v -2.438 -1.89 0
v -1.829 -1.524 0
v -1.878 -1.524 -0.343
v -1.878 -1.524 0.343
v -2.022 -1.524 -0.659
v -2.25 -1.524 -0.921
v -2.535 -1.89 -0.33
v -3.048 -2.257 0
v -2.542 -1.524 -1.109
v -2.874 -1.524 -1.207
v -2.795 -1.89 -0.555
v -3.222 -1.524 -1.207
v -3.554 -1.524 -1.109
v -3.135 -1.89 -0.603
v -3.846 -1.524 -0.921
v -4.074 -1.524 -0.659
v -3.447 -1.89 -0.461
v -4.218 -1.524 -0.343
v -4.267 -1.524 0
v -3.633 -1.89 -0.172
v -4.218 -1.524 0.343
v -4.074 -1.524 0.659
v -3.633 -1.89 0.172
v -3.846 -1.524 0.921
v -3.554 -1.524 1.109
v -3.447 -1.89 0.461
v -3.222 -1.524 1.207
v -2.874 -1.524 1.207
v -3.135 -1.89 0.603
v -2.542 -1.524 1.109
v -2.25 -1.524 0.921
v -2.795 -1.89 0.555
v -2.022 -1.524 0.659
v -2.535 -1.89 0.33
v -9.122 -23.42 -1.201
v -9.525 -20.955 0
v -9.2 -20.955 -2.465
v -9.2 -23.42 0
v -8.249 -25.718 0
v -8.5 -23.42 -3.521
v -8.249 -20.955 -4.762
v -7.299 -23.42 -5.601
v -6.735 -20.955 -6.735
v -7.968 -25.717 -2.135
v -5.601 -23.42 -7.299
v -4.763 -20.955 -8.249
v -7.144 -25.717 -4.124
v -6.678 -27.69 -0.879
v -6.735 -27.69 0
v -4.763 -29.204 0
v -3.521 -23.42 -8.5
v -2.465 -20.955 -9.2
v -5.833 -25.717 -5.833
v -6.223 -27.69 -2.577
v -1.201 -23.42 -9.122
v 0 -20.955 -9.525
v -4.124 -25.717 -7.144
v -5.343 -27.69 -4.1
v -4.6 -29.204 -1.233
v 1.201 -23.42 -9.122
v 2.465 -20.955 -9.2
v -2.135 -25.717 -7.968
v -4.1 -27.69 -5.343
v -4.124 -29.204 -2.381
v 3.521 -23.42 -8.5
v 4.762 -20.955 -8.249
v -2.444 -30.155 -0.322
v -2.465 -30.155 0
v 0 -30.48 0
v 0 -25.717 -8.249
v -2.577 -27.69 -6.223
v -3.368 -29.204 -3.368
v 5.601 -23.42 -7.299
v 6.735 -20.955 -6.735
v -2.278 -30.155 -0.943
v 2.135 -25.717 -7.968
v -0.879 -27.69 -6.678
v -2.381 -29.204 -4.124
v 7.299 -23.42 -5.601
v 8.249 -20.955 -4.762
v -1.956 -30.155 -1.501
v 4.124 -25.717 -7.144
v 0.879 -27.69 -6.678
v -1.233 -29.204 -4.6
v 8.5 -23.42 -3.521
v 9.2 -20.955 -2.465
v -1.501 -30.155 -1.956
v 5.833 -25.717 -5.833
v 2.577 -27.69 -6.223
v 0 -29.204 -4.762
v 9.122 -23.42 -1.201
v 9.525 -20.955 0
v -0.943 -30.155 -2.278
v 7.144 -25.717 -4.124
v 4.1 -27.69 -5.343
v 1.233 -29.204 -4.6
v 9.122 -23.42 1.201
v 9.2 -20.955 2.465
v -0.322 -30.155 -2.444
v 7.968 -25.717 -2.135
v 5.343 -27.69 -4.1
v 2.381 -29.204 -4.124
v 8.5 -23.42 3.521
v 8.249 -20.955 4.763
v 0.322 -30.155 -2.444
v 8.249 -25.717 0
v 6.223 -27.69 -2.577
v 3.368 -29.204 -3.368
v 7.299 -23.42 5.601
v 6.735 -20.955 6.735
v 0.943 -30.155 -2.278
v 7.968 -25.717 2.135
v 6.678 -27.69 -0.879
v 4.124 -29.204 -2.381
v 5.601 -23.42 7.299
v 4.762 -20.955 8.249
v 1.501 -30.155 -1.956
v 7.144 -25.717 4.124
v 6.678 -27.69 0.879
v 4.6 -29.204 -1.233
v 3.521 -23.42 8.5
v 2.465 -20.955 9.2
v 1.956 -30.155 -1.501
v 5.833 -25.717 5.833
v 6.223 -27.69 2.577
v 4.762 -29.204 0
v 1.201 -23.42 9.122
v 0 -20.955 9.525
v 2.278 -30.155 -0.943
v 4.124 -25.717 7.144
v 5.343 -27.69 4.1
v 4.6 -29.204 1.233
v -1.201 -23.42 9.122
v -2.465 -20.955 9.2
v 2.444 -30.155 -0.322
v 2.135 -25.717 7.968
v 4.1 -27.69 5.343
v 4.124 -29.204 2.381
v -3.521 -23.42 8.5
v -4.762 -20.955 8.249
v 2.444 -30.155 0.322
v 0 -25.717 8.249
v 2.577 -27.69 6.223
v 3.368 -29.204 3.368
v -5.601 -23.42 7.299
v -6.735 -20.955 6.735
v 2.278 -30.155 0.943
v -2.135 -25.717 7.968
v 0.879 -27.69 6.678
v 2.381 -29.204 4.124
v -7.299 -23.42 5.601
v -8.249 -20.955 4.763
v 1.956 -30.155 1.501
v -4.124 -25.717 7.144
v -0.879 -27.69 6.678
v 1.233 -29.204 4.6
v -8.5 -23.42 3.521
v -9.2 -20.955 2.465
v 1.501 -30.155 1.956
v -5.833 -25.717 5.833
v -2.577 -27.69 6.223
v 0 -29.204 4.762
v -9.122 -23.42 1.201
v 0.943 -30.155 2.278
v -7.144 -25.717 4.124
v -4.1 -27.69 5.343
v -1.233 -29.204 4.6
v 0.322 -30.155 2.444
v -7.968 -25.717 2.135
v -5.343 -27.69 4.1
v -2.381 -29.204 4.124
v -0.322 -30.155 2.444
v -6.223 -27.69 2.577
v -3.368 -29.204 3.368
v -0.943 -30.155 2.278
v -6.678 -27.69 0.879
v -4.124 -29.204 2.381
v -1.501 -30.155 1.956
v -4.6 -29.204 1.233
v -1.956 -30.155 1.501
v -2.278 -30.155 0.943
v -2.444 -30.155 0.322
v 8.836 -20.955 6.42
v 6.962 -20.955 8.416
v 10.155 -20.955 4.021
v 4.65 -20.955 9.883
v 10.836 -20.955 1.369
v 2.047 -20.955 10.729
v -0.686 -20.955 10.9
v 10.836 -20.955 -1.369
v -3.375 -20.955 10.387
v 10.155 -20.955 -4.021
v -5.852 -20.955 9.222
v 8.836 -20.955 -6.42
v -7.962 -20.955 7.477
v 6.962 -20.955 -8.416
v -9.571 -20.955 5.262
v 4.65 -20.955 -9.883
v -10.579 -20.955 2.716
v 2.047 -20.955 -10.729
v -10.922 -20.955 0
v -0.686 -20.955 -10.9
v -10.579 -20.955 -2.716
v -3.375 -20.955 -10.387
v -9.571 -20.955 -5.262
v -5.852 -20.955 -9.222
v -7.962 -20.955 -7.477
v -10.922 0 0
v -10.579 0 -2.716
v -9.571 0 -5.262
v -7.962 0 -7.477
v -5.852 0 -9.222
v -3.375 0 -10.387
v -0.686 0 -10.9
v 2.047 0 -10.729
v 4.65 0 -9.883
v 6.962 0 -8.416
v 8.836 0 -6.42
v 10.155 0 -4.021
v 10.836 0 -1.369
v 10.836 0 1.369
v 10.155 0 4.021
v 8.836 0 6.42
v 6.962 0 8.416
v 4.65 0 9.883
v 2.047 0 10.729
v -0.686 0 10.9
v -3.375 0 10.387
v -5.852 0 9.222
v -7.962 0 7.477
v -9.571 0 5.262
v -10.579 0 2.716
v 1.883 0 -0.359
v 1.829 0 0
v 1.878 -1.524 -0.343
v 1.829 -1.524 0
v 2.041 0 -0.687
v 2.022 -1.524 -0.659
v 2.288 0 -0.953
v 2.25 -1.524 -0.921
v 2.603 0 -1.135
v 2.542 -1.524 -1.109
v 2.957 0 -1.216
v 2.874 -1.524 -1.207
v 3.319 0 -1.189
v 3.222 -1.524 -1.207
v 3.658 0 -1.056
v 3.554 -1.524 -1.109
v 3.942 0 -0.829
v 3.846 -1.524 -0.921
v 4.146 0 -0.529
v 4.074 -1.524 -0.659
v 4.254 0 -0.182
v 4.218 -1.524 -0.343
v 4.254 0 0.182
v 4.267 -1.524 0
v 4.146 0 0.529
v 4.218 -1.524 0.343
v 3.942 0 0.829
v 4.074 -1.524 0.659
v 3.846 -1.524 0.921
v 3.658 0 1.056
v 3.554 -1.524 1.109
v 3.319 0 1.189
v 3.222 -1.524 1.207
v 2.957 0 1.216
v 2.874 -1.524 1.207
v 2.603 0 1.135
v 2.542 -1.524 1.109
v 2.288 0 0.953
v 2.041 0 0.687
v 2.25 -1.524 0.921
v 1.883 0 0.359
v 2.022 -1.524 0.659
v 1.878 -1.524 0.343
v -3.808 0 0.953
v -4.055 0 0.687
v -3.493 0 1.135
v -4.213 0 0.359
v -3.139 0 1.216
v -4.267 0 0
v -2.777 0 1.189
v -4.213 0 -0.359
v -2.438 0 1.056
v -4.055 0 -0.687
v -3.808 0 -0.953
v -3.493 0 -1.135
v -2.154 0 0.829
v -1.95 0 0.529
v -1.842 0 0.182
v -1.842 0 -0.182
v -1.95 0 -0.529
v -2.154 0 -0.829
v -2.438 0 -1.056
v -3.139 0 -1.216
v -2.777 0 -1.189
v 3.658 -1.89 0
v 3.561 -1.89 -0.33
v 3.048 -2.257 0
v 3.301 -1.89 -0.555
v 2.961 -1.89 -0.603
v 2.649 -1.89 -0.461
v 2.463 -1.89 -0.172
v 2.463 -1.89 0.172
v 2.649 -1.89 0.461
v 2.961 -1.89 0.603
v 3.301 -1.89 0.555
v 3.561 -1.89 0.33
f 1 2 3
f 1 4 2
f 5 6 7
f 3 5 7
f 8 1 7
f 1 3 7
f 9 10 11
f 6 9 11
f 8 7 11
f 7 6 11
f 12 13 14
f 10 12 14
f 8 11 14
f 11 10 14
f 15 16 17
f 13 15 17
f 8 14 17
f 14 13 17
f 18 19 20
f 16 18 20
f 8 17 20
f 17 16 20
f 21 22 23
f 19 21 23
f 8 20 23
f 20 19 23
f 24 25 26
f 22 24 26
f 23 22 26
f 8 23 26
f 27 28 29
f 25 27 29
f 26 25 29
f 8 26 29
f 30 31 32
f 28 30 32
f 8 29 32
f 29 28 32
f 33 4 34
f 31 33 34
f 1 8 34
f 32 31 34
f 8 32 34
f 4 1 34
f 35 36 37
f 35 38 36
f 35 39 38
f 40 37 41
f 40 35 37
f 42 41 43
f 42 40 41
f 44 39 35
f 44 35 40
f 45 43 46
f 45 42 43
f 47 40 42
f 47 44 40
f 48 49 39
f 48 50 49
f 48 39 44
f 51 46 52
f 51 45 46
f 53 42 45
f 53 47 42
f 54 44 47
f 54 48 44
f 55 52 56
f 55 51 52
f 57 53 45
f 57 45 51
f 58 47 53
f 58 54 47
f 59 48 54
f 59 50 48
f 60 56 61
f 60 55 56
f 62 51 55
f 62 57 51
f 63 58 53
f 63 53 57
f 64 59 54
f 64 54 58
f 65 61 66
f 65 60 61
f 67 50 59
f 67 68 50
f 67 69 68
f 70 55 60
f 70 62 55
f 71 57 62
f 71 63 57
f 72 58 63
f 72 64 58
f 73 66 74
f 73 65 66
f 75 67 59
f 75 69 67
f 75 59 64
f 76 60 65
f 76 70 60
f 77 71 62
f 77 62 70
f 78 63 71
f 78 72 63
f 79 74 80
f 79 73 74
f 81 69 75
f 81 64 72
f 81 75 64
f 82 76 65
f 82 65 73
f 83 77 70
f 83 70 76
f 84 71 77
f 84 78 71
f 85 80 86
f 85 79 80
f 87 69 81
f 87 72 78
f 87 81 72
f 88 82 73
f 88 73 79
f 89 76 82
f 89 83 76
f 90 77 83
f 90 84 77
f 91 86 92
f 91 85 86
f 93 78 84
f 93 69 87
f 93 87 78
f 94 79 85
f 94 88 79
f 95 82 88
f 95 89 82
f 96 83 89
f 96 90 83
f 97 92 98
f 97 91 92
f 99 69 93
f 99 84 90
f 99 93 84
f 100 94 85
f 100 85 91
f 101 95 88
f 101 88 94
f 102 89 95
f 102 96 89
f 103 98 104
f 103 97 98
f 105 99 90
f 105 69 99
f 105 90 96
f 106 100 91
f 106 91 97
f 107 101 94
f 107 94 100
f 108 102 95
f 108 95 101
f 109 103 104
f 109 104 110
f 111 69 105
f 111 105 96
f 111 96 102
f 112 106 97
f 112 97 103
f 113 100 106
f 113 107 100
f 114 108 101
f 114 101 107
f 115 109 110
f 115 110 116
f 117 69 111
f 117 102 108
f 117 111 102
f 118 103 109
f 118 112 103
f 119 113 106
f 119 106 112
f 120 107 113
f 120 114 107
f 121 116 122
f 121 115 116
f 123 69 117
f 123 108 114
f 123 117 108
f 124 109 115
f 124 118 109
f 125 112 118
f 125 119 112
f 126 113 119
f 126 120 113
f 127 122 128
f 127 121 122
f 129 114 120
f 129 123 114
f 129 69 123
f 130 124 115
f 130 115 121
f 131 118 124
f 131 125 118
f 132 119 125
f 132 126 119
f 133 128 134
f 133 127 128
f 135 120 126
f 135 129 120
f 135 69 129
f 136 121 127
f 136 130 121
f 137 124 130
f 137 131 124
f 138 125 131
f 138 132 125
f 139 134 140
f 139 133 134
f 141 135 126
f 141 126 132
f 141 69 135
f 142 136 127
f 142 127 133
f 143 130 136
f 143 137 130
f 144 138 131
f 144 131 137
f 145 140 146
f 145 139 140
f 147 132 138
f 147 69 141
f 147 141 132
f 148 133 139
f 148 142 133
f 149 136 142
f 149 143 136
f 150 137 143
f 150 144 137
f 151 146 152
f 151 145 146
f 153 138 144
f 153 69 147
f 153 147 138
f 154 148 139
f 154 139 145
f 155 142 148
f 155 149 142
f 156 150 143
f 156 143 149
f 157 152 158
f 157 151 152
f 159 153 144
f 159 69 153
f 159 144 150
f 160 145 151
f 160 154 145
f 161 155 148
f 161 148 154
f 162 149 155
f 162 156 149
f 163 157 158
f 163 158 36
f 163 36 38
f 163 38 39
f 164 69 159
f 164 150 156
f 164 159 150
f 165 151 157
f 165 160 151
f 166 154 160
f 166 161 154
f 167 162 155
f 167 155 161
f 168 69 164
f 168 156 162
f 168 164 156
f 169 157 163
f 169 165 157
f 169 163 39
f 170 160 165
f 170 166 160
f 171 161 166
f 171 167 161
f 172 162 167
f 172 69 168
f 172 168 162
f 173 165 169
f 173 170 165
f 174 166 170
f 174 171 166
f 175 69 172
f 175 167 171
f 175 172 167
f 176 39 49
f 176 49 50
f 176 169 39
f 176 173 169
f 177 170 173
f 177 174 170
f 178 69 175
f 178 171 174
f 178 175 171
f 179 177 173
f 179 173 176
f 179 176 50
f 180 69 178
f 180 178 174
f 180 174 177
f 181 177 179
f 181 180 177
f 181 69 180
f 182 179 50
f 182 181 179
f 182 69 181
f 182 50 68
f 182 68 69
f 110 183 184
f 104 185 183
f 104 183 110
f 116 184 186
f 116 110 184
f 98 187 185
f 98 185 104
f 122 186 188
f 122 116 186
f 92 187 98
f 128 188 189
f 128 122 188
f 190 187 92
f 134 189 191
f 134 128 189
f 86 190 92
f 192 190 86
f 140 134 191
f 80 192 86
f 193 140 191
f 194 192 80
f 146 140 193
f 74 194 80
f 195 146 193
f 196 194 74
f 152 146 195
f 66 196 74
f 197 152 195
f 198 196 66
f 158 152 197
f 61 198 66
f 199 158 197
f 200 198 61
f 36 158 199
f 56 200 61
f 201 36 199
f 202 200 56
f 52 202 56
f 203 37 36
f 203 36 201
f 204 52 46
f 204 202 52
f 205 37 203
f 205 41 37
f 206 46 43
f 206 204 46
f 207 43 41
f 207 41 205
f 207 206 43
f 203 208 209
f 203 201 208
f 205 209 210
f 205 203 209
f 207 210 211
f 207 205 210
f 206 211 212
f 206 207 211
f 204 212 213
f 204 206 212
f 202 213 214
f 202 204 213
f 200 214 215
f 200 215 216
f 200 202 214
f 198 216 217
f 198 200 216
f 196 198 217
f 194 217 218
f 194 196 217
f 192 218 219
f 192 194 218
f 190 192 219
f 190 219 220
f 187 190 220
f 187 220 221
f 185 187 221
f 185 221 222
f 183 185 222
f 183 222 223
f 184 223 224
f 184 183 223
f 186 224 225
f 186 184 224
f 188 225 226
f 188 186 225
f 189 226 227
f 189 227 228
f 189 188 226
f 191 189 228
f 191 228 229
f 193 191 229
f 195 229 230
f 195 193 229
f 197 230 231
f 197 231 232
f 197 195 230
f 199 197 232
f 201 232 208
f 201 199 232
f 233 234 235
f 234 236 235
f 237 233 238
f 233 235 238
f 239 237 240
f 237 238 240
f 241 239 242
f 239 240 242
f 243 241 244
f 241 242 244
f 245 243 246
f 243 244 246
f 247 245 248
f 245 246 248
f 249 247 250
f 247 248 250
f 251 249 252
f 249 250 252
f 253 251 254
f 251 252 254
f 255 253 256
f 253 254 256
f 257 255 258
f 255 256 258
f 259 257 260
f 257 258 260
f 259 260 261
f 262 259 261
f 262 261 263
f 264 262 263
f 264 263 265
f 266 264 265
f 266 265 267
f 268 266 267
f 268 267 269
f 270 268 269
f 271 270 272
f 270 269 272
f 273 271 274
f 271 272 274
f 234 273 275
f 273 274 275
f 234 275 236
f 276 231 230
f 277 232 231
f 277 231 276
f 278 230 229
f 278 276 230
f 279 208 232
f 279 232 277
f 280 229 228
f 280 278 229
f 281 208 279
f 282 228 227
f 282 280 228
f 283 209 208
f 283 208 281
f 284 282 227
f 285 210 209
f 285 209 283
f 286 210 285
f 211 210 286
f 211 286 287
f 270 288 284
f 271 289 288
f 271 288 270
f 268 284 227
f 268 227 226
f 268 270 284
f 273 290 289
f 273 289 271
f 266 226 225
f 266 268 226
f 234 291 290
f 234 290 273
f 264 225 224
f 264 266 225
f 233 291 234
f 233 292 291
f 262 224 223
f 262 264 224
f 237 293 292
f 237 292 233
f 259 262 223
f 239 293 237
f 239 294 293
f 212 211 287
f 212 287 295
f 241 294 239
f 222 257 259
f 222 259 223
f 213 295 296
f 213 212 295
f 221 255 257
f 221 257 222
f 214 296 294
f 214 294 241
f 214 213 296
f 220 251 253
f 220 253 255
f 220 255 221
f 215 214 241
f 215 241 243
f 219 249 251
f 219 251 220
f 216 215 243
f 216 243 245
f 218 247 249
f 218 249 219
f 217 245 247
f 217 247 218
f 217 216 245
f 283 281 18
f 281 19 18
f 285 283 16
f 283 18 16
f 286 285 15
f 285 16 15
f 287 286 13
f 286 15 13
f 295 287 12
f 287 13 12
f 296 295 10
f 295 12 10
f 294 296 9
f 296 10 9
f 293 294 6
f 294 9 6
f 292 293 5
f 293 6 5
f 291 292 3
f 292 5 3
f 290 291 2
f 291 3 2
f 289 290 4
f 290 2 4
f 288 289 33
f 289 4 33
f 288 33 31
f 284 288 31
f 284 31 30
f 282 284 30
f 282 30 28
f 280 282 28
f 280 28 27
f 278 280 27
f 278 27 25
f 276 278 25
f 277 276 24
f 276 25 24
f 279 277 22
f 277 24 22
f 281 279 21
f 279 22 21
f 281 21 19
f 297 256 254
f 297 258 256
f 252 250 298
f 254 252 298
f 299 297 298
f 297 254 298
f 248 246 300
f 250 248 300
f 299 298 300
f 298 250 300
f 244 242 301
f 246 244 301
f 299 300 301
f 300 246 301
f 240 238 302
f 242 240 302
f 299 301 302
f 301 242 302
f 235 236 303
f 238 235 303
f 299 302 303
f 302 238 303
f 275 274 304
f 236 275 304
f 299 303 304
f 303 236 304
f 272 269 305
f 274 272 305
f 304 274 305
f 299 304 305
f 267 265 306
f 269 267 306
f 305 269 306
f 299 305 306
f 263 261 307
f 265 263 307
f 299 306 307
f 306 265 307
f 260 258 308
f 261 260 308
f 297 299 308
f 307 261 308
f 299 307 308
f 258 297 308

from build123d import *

# Parameters (mm, degrees)
F_2_CLEARANCE_HOLE1_D     = 2.4384
F_2_CLEARANCE_HOLE1_DEPTH = 1.524
F_2_CLEARANCE_HOLE1_TIP   = 0.732569267


with BuildPart() as part:
    # Sketch1 → Revolve1 (revolve)
    with BuildSketch(Plane.XY):
        with BuildLine():
            Line((0, 0), (-10.922, 0))
            Line((-10.922, 0), (-10.922, -20.955))
            Line((-10.922, -20.955), (-9.525, -20.955))
            ThreePointArc((-9.525, -20.955), (-6.735192091, -27.690192091), (0, -30.48))
            Line((0, -30.48), (0, 0))
        make_face()
    revolve(axis=Axis((0, 0, 0), (0, -1, 0)))

    # #2 Clearance Hole1
    with Locations(Plane(origin=(0, 0, 0), x_dir=(1, 0, 0), z_dir=(0, 1, 0))):
        with Locations((3.048, 0), (-3.048, 0)):
            Hole(F_2_CLEARANCE_HOLE1_D / 2, depth=F_2_CLEARANCE_HOLE1_DEPTH)
            with Locations((0, 0, -(F_2_CLEARANCE_HOLE1_DEPTH + F_2_CLEARANCE_HOLE1_TIP / 2))):  # 118° drill point
                Cone(0, F_2_CLEARANCE_HOLE1_D / 2, F_2_CLEARANCE_HOLE1_TIP, mode=Mode.SUBTRACT)


solid = part.part
